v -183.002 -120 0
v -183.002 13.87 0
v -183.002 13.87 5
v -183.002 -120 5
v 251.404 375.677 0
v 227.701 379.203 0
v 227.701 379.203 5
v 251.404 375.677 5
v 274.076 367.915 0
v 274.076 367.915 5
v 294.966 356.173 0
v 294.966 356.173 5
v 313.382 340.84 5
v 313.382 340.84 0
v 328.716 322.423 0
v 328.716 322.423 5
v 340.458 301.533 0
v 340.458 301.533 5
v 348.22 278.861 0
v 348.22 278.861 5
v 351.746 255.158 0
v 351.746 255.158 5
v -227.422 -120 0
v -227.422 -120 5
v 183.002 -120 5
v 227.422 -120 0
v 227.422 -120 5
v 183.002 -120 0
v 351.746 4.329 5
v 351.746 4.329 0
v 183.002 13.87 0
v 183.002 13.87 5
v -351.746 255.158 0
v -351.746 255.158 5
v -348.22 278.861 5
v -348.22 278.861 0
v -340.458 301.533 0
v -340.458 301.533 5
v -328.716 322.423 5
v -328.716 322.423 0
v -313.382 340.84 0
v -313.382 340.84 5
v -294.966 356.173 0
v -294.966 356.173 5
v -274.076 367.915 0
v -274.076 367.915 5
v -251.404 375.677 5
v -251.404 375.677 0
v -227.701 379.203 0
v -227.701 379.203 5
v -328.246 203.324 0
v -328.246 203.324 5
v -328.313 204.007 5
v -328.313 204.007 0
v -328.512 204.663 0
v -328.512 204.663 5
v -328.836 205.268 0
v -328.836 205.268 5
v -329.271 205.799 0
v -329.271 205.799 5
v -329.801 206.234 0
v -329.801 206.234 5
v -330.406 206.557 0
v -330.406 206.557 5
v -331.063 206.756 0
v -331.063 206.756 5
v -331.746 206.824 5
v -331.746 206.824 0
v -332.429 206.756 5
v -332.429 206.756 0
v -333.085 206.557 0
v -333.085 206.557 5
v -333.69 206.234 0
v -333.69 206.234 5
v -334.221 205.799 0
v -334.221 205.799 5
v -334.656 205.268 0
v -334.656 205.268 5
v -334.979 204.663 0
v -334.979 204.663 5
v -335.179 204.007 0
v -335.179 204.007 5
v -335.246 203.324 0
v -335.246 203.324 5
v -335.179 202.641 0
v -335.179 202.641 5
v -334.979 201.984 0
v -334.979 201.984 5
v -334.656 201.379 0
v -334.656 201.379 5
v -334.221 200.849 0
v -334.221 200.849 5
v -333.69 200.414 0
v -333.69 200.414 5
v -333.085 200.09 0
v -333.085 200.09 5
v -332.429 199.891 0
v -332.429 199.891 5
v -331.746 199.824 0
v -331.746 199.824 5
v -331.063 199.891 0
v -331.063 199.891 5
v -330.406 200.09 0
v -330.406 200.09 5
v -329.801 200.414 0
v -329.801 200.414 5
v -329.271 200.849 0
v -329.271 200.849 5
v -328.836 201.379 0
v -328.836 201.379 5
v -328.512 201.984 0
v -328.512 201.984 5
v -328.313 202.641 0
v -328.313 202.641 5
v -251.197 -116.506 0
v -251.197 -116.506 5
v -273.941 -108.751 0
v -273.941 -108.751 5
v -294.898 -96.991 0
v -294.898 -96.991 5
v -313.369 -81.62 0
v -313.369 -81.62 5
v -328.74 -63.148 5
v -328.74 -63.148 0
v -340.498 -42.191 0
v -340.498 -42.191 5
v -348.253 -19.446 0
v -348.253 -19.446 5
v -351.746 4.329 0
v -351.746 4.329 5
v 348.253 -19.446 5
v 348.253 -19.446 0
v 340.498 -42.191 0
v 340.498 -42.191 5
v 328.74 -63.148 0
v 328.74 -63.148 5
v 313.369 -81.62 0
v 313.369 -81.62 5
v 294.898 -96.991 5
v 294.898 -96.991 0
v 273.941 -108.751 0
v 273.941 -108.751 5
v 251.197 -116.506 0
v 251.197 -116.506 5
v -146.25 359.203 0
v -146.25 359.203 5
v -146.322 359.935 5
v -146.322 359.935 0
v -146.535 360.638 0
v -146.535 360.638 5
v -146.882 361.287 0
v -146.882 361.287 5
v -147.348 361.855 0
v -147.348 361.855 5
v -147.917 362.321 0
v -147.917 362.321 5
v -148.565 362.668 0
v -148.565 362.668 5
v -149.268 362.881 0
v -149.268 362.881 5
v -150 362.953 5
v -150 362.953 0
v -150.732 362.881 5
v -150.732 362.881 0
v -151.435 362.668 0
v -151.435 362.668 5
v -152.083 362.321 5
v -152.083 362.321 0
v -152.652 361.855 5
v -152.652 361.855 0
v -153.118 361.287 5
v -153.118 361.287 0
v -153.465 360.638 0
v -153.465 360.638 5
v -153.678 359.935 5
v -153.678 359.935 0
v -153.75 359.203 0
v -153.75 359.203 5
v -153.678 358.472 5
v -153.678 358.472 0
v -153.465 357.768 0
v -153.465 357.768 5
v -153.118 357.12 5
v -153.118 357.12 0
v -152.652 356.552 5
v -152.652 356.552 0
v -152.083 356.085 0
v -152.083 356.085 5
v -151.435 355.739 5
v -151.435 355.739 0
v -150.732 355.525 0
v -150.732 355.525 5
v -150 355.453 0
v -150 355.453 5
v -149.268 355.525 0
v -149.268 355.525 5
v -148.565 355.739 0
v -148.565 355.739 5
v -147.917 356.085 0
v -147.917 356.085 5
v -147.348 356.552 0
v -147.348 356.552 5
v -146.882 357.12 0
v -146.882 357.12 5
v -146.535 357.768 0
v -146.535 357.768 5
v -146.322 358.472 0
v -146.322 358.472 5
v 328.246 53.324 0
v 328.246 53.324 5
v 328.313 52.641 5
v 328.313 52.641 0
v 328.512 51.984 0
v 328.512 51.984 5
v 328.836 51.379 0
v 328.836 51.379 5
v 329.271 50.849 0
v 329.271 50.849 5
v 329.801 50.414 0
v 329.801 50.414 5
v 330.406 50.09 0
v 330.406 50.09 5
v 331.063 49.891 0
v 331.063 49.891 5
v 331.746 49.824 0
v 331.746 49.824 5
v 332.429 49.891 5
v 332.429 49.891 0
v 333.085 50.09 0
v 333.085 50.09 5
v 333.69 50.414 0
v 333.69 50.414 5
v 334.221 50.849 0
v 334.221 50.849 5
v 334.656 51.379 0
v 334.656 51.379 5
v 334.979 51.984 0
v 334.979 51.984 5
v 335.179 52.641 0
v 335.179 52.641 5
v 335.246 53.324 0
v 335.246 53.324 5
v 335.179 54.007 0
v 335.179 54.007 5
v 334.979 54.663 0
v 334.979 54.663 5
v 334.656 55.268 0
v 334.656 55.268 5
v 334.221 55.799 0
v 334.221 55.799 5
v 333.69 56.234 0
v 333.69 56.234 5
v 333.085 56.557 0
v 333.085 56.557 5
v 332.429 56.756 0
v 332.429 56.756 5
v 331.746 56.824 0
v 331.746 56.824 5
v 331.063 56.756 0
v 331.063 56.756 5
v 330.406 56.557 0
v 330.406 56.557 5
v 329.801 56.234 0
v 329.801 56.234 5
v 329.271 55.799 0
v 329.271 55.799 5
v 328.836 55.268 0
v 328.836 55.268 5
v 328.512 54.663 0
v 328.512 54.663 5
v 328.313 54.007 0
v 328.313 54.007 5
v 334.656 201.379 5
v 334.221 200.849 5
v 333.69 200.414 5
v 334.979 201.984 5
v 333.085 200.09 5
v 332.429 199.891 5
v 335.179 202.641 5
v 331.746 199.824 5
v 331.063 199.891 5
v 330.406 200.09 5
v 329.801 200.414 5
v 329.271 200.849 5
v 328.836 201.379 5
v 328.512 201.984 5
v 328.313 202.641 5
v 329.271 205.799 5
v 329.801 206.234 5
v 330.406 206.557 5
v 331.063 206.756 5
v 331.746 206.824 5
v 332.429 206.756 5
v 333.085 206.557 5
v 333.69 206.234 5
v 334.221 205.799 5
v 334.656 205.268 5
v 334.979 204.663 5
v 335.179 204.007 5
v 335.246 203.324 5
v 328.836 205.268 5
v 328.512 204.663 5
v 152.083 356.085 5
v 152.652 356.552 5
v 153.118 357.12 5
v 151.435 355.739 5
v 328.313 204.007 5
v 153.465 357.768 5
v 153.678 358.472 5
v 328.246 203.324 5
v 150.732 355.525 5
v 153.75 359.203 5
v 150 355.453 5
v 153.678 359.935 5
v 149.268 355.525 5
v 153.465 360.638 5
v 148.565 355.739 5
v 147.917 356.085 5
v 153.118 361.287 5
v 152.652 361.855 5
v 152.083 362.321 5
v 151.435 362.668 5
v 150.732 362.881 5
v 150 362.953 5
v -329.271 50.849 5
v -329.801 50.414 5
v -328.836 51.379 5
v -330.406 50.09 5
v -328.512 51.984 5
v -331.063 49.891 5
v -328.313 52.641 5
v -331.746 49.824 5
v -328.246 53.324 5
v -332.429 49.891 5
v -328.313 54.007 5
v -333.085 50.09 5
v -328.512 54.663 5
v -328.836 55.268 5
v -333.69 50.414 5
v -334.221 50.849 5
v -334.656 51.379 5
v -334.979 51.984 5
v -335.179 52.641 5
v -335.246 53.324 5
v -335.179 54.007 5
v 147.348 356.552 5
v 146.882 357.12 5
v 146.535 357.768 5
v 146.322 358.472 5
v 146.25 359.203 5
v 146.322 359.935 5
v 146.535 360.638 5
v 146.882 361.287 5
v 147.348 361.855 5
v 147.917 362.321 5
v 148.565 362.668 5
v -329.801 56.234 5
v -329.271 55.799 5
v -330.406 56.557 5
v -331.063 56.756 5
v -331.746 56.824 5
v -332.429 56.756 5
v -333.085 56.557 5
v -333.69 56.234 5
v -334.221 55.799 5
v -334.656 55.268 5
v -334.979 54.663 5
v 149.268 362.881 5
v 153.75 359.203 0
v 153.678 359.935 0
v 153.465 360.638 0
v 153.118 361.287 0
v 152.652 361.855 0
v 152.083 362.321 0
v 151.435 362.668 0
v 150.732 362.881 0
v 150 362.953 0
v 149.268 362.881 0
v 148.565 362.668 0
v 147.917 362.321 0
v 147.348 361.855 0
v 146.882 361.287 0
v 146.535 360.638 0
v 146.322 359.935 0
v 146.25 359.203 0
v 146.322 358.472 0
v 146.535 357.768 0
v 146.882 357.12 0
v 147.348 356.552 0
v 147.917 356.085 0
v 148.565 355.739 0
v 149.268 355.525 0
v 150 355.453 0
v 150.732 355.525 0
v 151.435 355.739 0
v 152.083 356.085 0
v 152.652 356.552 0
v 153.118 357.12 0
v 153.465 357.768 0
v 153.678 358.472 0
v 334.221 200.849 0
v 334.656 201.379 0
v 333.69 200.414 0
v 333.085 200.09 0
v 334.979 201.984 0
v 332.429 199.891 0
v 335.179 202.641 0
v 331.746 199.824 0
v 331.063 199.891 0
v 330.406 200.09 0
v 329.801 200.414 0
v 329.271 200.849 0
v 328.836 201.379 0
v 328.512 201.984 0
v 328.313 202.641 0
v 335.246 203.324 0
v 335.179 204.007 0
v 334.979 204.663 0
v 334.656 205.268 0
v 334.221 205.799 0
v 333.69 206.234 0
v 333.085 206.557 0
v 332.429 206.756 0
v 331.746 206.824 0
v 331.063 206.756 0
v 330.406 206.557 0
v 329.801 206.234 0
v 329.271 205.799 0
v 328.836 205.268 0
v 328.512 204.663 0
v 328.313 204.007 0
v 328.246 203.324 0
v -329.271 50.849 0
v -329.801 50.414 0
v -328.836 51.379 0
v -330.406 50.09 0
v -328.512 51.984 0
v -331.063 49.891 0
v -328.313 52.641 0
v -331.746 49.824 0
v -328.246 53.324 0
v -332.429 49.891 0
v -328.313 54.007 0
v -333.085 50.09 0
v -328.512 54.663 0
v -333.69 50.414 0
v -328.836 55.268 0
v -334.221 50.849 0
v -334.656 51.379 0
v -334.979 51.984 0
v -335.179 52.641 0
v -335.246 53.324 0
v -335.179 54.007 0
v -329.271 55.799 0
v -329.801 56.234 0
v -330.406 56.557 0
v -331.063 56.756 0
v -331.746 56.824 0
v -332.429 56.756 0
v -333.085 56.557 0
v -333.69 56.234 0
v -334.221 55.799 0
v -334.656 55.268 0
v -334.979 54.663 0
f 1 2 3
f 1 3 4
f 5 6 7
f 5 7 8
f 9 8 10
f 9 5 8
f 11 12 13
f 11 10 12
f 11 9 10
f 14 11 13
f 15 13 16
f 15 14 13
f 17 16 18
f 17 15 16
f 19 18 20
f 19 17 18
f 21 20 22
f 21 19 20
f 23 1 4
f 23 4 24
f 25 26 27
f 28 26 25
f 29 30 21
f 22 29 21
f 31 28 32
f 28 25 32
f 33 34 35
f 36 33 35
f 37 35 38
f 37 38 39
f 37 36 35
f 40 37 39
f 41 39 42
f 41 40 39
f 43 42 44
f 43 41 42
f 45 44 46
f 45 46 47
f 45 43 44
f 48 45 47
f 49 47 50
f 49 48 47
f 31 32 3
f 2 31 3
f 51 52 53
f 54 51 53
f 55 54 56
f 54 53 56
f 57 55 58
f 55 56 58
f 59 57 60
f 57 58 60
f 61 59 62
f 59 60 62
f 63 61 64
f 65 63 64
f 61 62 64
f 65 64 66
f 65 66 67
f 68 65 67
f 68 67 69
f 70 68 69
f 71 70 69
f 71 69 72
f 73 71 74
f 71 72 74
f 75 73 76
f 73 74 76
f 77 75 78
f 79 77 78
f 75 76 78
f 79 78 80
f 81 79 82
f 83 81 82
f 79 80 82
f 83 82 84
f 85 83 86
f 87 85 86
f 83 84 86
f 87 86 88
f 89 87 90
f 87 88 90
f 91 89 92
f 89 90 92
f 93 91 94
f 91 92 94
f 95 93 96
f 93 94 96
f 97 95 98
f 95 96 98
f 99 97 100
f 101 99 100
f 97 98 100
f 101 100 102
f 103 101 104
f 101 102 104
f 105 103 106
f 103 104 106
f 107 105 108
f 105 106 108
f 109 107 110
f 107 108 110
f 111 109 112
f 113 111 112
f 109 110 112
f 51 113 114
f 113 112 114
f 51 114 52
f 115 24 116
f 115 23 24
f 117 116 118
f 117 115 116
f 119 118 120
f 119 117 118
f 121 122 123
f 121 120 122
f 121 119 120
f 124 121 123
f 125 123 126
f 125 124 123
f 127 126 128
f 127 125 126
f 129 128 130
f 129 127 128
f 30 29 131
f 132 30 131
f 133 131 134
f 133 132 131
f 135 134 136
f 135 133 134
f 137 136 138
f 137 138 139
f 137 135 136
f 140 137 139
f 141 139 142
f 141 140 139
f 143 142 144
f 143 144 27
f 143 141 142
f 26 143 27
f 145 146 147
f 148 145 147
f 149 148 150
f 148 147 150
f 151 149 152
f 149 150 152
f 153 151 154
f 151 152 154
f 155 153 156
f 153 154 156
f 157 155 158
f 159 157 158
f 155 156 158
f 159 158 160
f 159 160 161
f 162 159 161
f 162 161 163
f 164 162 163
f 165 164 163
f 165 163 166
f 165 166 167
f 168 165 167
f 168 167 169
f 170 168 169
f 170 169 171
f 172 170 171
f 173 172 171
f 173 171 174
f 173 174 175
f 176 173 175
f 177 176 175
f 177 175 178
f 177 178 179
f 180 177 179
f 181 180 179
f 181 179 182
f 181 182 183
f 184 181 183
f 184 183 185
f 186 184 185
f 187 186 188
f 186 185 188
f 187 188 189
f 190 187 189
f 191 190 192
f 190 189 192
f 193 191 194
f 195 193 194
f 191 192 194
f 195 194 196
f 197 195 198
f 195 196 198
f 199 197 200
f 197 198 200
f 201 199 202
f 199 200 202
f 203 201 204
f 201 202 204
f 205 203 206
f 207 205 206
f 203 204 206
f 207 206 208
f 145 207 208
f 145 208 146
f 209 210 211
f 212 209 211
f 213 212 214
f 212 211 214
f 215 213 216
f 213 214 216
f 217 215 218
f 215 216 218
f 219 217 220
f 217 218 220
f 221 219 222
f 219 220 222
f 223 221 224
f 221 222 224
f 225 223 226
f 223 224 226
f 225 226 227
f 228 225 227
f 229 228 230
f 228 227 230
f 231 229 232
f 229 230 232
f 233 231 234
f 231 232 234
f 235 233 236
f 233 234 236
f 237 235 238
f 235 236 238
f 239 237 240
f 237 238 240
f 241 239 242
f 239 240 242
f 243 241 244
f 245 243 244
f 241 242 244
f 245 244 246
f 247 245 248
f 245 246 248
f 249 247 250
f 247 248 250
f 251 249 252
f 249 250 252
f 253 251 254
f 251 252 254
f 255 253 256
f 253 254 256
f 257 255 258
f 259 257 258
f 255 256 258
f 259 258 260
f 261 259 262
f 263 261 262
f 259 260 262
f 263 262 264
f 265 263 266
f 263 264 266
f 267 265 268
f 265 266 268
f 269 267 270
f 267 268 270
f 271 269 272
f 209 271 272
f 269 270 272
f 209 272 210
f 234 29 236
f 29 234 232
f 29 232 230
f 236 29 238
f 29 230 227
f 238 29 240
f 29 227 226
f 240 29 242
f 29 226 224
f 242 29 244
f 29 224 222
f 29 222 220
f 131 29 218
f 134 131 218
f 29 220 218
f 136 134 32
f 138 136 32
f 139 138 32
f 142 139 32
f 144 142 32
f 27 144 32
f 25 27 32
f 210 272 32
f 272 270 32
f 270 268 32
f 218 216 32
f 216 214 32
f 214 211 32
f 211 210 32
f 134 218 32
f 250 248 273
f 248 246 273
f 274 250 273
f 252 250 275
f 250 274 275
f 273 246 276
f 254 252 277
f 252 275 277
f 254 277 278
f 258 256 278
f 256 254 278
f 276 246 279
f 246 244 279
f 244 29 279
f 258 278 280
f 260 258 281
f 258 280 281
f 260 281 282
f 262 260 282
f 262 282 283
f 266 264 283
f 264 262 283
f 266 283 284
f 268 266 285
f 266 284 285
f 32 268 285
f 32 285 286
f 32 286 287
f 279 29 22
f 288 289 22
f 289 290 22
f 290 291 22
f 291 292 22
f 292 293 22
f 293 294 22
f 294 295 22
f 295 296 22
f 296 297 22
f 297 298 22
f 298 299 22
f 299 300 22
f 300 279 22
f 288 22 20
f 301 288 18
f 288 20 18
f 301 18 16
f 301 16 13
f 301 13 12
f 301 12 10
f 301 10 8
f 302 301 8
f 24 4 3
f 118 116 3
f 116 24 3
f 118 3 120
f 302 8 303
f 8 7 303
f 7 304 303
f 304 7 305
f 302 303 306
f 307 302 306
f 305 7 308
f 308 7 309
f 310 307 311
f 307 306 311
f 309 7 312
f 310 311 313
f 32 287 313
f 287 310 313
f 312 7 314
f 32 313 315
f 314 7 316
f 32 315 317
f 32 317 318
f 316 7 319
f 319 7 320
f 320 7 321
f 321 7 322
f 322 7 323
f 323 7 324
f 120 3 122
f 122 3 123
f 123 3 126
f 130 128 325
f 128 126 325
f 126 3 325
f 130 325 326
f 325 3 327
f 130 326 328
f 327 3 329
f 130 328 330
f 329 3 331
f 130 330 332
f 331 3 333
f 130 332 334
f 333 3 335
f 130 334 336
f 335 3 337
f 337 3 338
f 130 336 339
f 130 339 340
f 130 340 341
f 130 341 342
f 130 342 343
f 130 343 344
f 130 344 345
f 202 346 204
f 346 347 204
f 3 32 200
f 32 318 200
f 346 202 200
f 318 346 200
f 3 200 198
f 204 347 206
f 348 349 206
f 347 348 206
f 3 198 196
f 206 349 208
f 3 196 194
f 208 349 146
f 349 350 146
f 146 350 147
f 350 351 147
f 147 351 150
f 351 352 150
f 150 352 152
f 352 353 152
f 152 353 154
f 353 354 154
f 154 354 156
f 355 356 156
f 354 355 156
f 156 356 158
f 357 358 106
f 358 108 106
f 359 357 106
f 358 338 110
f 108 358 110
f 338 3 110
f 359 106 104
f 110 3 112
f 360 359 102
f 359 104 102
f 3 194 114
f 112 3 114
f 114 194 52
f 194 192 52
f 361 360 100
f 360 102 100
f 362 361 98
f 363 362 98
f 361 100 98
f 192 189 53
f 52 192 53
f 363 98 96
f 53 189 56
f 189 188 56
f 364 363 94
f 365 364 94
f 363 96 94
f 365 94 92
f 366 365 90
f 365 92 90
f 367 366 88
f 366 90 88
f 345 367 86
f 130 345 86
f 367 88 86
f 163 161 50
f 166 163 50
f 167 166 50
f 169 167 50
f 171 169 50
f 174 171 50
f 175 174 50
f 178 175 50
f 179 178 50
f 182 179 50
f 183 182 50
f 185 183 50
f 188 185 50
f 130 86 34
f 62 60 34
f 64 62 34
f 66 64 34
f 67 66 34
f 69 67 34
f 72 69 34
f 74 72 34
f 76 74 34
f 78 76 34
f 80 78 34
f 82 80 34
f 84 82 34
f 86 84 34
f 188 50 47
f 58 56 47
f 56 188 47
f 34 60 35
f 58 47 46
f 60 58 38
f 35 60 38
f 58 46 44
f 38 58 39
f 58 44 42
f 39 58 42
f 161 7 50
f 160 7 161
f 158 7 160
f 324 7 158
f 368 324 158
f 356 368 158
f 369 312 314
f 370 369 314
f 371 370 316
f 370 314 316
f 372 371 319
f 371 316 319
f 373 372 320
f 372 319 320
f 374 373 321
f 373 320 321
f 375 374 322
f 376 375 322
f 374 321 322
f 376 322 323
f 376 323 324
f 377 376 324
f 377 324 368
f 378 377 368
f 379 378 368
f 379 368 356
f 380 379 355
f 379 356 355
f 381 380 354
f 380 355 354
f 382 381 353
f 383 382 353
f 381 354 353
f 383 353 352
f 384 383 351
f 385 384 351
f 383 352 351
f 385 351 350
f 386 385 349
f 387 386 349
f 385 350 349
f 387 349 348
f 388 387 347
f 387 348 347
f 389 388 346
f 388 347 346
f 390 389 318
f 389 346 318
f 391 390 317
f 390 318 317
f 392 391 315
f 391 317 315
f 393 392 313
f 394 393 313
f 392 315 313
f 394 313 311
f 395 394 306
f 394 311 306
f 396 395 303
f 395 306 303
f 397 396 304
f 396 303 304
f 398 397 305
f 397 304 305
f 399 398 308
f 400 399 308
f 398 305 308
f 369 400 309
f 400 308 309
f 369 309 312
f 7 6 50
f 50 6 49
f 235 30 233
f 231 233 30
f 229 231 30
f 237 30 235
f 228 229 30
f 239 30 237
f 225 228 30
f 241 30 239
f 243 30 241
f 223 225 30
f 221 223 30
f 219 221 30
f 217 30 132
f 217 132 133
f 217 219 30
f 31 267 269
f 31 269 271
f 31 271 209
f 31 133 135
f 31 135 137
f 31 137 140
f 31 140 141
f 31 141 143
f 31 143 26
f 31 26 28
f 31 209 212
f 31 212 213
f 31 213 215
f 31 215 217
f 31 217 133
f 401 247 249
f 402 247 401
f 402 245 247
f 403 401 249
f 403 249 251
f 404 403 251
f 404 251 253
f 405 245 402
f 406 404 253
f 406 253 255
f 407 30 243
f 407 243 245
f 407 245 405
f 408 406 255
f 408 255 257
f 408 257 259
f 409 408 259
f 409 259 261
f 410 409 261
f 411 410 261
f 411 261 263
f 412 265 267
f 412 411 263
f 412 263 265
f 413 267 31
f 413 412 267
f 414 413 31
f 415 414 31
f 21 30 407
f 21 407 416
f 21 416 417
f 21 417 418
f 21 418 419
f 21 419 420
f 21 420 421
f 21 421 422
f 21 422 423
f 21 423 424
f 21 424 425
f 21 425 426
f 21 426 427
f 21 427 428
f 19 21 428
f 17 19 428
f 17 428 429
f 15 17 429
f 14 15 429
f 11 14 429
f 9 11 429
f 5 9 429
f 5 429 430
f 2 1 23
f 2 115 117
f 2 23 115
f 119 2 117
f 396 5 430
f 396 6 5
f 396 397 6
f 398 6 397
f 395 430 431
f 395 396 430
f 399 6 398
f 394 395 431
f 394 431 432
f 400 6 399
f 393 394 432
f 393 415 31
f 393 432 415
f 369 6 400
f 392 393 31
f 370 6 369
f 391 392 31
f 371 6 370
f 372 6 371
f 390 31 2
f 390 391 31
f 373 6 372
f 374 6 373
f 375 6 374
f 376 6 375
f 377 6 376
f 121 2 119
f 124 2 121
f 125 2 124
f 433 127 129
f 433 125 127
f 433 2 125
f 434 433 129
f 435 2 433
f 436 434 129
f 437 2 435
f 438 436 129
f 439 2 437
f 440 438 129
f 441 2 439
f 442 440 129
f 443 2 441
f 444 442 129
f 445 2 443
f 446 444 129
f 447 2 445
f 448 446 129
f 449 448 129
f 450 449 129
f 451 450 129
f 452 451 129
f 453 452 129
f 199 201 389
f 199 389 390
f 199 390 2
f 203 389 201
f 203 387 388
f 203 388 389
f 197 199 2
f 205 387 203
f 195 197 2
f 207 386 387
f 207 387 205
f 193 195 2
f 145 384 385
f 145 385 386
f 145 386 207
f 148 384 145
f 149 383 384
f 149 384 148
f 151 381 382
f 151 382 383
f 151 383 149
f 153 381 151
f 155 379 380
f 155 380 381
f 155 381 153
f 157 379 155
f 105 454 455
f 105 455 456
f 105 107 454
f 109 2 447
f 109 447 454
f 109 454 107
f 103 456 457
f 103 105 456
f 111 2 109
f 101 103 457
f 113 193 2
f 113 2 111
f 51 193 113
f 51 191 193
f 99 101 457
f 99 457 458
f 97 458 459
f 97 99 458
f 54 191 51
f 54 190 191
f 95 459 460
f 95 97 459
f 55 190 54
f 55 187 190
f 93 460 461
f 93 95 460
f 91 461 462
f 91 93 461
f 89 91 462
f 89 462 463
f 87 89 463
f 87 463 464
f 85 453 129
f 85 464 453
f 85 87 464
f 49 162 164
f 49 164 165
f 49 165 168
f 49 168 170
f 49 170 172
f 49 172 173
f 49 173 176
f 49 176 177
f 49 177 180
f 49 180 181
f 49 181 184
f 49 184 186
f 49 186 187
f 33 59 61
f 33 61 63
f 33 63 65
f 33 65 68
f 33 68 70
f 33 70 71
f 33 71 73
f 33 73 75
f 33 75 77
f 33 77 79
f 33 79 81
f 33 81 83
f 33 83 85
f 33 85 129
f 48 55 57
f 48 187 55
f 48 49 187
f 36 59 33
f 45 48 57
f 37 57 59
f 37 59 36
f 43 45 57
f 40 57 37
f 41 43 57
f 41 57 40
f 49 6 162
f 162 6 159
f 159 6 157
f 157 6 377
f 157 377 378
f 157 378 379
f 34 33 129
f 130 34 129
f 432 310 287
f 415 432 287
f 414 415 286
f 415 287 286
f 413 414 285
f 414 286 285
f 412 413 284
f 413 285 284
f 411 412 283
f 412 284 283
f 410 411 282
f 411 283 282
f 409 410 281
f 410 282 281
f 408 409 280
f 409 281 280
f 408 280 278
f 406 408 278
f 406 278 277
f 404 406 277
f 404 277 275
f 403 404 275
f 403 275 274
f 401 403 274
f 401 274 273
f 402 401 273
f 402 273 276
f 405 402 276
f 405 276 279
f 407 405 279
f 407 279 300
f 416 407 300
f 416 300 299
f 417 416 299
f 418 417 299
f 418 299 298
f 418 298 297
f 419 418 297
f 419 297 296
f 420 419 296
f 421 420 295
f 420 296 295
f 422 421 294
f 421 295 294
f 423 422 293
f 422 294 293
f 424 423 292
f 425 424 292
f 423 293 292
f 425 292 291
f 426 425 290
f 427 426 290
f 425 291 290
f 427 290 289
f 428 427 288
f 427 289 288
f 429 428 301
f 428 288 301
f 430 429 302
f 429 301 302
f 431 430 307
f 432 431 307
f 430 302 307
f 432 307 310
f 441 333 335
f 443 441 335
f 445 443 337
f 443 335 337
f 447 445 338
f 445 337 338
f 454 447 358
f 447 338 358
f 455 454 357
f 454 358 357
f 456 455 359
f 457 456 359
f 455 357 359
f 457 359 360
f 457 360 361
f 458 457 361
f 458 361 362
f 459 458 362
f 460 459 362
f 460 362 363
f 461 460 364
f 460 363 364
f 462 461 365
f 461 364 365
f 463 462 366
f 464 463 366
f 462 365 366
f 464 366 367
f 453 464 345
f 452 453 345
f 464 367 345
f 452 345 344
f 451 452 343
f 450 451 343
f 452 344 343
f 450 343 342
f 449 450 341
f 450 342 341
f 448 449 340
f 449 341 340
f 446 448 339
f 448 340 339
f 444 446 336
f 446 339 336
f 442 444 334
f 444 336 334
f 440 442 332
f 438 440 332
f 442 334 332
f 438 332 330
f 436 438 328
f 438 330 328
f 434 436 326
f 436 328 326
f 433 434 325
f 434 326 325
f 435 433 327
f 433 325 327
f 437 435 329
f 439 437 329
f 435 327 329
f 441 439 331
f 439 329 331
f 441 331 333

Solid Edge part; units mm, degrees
sketch "Sketch1" plane through (0, 0, 0) normal (0, 0, 1) x (1, 0, 0)
  line L0 (-183.0017, -120) -> (-227.4217, -120)
  line L1 (-289.5811, -57.8353) -> (-227.4217, -120)
  line L2 (-289.5811, -57.8353) -> (-351.7458, 4.3295)
  line L3 (-351.7458, 129.7437) -> (-351.7458, 4.3295)
  line L4 (-351.7458, 129.7437) -> (-351.7458, 255.1579)
  line L5 (-289.4346, 317.4691) -> (-351.7458, 255.1579)
  line L6 (-289.4346, 317.4691) -> (-227.7006, 379.2031)
  line L7 (0, 379.2031) -> (-227.7006, 379.2031)
  line L8 (0, 379.2031) -> (0, 0)
  line L9 (0, 0) -> (-183.0017, 0)
  line L10 (-183.0017, 0) -> (-183.0017, -120)
  dimension "D1" = 351.7458
  dimension "D2" = 227.7006
  dimension "D3" = 120
  dimension "D4" = 44.42
  dimension "D5" = 87.3051
  dimension "D6" = 88.1213
  dimension "D7" = 125.4142
  dimension "D8" = 125.4142
  dimension "D9" = 87.9142
  dimension "D10" = 87.9104
  dimension "D11" = 499.2031
extrude "Protrusion1" add sketch "Sketch1" along normal blind 5
mirror "Mirror1" about plane through (0, 0, 0) normal (1, 0, 0) of "Protrusion1"
sketch "Sketch2" plane through (0, 149.6016, 5) normal (0, 0, 1) x (1, 0, 0)
  circle A0 centre (150, 209.6016) radius 3.75
  circle A1 centre (-150, 209.6016) radius 3.75
  dimension "D1" = 20
  dimension "D2" = 7.5
  dimension "D3" = 300
extrude "Cutout1" cut sketch "Sketch2" against normal through all
sketch "Sketch3" plane through (0, 149.6016, 5) normal (0, 0, 1) x (1, 0, 0)
  circle A0 centre (-331.7458, 53.7221) radius 3.5
  circle A1 centre (-331.7458, -96.2779) radius 3.5
  dimension "D1" = 160
  dimension "D2" = 20
  dimension "D3" = 6.42
  dimension "D4" = 7
  dimension "D5" = 3.58
extrude "Cutout2" cut sketch "Sketch3" against normal through all
mirror "Mirror2" about plane through (0, 0, 0) normal (1, 0, 0) of "Cutout2"
sketch "Sketch4" plane through (0, 149.6016, 0) normal (0, 0, -1) x (-1, 0, 0)
  line L0 (-351.7458, -111.1142) -> (-193.1203, -269.6016)
  line L1 (-193.1203, -269.6016) -> (-227.4217, -269.6016)
  arc A0 (-351.7458, -145.2721) -> (-227.4217, -269.6016) centre (-220.2414, -138.0974) ccw
  line L2 (-351.7458, -111.1142) -> (-351.7458, -145.2721)
  dimension "D1" = 131.7
extrude "Protrusion2" add sketch "Sketch4" against normal up to vertex (5 mm away)
sketch "Sketch5" plane through (0, 149.6016, 0) normal (0, 0, -1) x (-1, 0, 0)
  line L0 (-227.7006, 229.6016) -> (-351.7458, 105.5563)
  arc A0 (-351.7458, 105.5563) -> (-227.7006, 229.6016) centre (-220.2564, 98.1121) cw
extrude "Protrusion3" add sketch "Sketch5" against normal up to vertex (5 mm away)
mirror "Mirror3" about plane through (0, 0, 0) normal (1, 0, 0) of "Protrusion3", "Protrusion2"
sketch "Sketch6" plane through (0, 0, 2.5) normal (0, -1, 0) x (1, 0, 0)
  line L0 (-183.0017, 2.5) -> (183.0017, 2.5)
  line L1 (183.0017, 2.5) -> (183.0017, -2.5)
  line L2 (183.0017, -2.5) -> (-183.0017, -2.5)
  line L3 (-183.0017, -2.5) -> (-183.0017, 2.5)
extrude "Extrusionsausprägung_11" add sketch "Sketch6" along normal blind 1.13
sketch "Sketch7" plane through (0, 129.6016, 5) normal (0, 0, 1) x (1, 0, 0)
  line L0 (-183.0017, -130.7316) -> (183.0017, -130.7316)
  line L1 (183.0017, -130.7316) -> (183.0017, -115.7316)
  line L2 (183.0017, -115.7316) -> (-183.0017, -115.7316)
  line L3 (-183.0017, -115.7316) -> (-183.0017, -130.7316)
  dimension "D1" = 15
extrude "Cutout3" cut sketch "Sketch7" against normal through all
properties material "ABS-Plastik, mittelfest"
